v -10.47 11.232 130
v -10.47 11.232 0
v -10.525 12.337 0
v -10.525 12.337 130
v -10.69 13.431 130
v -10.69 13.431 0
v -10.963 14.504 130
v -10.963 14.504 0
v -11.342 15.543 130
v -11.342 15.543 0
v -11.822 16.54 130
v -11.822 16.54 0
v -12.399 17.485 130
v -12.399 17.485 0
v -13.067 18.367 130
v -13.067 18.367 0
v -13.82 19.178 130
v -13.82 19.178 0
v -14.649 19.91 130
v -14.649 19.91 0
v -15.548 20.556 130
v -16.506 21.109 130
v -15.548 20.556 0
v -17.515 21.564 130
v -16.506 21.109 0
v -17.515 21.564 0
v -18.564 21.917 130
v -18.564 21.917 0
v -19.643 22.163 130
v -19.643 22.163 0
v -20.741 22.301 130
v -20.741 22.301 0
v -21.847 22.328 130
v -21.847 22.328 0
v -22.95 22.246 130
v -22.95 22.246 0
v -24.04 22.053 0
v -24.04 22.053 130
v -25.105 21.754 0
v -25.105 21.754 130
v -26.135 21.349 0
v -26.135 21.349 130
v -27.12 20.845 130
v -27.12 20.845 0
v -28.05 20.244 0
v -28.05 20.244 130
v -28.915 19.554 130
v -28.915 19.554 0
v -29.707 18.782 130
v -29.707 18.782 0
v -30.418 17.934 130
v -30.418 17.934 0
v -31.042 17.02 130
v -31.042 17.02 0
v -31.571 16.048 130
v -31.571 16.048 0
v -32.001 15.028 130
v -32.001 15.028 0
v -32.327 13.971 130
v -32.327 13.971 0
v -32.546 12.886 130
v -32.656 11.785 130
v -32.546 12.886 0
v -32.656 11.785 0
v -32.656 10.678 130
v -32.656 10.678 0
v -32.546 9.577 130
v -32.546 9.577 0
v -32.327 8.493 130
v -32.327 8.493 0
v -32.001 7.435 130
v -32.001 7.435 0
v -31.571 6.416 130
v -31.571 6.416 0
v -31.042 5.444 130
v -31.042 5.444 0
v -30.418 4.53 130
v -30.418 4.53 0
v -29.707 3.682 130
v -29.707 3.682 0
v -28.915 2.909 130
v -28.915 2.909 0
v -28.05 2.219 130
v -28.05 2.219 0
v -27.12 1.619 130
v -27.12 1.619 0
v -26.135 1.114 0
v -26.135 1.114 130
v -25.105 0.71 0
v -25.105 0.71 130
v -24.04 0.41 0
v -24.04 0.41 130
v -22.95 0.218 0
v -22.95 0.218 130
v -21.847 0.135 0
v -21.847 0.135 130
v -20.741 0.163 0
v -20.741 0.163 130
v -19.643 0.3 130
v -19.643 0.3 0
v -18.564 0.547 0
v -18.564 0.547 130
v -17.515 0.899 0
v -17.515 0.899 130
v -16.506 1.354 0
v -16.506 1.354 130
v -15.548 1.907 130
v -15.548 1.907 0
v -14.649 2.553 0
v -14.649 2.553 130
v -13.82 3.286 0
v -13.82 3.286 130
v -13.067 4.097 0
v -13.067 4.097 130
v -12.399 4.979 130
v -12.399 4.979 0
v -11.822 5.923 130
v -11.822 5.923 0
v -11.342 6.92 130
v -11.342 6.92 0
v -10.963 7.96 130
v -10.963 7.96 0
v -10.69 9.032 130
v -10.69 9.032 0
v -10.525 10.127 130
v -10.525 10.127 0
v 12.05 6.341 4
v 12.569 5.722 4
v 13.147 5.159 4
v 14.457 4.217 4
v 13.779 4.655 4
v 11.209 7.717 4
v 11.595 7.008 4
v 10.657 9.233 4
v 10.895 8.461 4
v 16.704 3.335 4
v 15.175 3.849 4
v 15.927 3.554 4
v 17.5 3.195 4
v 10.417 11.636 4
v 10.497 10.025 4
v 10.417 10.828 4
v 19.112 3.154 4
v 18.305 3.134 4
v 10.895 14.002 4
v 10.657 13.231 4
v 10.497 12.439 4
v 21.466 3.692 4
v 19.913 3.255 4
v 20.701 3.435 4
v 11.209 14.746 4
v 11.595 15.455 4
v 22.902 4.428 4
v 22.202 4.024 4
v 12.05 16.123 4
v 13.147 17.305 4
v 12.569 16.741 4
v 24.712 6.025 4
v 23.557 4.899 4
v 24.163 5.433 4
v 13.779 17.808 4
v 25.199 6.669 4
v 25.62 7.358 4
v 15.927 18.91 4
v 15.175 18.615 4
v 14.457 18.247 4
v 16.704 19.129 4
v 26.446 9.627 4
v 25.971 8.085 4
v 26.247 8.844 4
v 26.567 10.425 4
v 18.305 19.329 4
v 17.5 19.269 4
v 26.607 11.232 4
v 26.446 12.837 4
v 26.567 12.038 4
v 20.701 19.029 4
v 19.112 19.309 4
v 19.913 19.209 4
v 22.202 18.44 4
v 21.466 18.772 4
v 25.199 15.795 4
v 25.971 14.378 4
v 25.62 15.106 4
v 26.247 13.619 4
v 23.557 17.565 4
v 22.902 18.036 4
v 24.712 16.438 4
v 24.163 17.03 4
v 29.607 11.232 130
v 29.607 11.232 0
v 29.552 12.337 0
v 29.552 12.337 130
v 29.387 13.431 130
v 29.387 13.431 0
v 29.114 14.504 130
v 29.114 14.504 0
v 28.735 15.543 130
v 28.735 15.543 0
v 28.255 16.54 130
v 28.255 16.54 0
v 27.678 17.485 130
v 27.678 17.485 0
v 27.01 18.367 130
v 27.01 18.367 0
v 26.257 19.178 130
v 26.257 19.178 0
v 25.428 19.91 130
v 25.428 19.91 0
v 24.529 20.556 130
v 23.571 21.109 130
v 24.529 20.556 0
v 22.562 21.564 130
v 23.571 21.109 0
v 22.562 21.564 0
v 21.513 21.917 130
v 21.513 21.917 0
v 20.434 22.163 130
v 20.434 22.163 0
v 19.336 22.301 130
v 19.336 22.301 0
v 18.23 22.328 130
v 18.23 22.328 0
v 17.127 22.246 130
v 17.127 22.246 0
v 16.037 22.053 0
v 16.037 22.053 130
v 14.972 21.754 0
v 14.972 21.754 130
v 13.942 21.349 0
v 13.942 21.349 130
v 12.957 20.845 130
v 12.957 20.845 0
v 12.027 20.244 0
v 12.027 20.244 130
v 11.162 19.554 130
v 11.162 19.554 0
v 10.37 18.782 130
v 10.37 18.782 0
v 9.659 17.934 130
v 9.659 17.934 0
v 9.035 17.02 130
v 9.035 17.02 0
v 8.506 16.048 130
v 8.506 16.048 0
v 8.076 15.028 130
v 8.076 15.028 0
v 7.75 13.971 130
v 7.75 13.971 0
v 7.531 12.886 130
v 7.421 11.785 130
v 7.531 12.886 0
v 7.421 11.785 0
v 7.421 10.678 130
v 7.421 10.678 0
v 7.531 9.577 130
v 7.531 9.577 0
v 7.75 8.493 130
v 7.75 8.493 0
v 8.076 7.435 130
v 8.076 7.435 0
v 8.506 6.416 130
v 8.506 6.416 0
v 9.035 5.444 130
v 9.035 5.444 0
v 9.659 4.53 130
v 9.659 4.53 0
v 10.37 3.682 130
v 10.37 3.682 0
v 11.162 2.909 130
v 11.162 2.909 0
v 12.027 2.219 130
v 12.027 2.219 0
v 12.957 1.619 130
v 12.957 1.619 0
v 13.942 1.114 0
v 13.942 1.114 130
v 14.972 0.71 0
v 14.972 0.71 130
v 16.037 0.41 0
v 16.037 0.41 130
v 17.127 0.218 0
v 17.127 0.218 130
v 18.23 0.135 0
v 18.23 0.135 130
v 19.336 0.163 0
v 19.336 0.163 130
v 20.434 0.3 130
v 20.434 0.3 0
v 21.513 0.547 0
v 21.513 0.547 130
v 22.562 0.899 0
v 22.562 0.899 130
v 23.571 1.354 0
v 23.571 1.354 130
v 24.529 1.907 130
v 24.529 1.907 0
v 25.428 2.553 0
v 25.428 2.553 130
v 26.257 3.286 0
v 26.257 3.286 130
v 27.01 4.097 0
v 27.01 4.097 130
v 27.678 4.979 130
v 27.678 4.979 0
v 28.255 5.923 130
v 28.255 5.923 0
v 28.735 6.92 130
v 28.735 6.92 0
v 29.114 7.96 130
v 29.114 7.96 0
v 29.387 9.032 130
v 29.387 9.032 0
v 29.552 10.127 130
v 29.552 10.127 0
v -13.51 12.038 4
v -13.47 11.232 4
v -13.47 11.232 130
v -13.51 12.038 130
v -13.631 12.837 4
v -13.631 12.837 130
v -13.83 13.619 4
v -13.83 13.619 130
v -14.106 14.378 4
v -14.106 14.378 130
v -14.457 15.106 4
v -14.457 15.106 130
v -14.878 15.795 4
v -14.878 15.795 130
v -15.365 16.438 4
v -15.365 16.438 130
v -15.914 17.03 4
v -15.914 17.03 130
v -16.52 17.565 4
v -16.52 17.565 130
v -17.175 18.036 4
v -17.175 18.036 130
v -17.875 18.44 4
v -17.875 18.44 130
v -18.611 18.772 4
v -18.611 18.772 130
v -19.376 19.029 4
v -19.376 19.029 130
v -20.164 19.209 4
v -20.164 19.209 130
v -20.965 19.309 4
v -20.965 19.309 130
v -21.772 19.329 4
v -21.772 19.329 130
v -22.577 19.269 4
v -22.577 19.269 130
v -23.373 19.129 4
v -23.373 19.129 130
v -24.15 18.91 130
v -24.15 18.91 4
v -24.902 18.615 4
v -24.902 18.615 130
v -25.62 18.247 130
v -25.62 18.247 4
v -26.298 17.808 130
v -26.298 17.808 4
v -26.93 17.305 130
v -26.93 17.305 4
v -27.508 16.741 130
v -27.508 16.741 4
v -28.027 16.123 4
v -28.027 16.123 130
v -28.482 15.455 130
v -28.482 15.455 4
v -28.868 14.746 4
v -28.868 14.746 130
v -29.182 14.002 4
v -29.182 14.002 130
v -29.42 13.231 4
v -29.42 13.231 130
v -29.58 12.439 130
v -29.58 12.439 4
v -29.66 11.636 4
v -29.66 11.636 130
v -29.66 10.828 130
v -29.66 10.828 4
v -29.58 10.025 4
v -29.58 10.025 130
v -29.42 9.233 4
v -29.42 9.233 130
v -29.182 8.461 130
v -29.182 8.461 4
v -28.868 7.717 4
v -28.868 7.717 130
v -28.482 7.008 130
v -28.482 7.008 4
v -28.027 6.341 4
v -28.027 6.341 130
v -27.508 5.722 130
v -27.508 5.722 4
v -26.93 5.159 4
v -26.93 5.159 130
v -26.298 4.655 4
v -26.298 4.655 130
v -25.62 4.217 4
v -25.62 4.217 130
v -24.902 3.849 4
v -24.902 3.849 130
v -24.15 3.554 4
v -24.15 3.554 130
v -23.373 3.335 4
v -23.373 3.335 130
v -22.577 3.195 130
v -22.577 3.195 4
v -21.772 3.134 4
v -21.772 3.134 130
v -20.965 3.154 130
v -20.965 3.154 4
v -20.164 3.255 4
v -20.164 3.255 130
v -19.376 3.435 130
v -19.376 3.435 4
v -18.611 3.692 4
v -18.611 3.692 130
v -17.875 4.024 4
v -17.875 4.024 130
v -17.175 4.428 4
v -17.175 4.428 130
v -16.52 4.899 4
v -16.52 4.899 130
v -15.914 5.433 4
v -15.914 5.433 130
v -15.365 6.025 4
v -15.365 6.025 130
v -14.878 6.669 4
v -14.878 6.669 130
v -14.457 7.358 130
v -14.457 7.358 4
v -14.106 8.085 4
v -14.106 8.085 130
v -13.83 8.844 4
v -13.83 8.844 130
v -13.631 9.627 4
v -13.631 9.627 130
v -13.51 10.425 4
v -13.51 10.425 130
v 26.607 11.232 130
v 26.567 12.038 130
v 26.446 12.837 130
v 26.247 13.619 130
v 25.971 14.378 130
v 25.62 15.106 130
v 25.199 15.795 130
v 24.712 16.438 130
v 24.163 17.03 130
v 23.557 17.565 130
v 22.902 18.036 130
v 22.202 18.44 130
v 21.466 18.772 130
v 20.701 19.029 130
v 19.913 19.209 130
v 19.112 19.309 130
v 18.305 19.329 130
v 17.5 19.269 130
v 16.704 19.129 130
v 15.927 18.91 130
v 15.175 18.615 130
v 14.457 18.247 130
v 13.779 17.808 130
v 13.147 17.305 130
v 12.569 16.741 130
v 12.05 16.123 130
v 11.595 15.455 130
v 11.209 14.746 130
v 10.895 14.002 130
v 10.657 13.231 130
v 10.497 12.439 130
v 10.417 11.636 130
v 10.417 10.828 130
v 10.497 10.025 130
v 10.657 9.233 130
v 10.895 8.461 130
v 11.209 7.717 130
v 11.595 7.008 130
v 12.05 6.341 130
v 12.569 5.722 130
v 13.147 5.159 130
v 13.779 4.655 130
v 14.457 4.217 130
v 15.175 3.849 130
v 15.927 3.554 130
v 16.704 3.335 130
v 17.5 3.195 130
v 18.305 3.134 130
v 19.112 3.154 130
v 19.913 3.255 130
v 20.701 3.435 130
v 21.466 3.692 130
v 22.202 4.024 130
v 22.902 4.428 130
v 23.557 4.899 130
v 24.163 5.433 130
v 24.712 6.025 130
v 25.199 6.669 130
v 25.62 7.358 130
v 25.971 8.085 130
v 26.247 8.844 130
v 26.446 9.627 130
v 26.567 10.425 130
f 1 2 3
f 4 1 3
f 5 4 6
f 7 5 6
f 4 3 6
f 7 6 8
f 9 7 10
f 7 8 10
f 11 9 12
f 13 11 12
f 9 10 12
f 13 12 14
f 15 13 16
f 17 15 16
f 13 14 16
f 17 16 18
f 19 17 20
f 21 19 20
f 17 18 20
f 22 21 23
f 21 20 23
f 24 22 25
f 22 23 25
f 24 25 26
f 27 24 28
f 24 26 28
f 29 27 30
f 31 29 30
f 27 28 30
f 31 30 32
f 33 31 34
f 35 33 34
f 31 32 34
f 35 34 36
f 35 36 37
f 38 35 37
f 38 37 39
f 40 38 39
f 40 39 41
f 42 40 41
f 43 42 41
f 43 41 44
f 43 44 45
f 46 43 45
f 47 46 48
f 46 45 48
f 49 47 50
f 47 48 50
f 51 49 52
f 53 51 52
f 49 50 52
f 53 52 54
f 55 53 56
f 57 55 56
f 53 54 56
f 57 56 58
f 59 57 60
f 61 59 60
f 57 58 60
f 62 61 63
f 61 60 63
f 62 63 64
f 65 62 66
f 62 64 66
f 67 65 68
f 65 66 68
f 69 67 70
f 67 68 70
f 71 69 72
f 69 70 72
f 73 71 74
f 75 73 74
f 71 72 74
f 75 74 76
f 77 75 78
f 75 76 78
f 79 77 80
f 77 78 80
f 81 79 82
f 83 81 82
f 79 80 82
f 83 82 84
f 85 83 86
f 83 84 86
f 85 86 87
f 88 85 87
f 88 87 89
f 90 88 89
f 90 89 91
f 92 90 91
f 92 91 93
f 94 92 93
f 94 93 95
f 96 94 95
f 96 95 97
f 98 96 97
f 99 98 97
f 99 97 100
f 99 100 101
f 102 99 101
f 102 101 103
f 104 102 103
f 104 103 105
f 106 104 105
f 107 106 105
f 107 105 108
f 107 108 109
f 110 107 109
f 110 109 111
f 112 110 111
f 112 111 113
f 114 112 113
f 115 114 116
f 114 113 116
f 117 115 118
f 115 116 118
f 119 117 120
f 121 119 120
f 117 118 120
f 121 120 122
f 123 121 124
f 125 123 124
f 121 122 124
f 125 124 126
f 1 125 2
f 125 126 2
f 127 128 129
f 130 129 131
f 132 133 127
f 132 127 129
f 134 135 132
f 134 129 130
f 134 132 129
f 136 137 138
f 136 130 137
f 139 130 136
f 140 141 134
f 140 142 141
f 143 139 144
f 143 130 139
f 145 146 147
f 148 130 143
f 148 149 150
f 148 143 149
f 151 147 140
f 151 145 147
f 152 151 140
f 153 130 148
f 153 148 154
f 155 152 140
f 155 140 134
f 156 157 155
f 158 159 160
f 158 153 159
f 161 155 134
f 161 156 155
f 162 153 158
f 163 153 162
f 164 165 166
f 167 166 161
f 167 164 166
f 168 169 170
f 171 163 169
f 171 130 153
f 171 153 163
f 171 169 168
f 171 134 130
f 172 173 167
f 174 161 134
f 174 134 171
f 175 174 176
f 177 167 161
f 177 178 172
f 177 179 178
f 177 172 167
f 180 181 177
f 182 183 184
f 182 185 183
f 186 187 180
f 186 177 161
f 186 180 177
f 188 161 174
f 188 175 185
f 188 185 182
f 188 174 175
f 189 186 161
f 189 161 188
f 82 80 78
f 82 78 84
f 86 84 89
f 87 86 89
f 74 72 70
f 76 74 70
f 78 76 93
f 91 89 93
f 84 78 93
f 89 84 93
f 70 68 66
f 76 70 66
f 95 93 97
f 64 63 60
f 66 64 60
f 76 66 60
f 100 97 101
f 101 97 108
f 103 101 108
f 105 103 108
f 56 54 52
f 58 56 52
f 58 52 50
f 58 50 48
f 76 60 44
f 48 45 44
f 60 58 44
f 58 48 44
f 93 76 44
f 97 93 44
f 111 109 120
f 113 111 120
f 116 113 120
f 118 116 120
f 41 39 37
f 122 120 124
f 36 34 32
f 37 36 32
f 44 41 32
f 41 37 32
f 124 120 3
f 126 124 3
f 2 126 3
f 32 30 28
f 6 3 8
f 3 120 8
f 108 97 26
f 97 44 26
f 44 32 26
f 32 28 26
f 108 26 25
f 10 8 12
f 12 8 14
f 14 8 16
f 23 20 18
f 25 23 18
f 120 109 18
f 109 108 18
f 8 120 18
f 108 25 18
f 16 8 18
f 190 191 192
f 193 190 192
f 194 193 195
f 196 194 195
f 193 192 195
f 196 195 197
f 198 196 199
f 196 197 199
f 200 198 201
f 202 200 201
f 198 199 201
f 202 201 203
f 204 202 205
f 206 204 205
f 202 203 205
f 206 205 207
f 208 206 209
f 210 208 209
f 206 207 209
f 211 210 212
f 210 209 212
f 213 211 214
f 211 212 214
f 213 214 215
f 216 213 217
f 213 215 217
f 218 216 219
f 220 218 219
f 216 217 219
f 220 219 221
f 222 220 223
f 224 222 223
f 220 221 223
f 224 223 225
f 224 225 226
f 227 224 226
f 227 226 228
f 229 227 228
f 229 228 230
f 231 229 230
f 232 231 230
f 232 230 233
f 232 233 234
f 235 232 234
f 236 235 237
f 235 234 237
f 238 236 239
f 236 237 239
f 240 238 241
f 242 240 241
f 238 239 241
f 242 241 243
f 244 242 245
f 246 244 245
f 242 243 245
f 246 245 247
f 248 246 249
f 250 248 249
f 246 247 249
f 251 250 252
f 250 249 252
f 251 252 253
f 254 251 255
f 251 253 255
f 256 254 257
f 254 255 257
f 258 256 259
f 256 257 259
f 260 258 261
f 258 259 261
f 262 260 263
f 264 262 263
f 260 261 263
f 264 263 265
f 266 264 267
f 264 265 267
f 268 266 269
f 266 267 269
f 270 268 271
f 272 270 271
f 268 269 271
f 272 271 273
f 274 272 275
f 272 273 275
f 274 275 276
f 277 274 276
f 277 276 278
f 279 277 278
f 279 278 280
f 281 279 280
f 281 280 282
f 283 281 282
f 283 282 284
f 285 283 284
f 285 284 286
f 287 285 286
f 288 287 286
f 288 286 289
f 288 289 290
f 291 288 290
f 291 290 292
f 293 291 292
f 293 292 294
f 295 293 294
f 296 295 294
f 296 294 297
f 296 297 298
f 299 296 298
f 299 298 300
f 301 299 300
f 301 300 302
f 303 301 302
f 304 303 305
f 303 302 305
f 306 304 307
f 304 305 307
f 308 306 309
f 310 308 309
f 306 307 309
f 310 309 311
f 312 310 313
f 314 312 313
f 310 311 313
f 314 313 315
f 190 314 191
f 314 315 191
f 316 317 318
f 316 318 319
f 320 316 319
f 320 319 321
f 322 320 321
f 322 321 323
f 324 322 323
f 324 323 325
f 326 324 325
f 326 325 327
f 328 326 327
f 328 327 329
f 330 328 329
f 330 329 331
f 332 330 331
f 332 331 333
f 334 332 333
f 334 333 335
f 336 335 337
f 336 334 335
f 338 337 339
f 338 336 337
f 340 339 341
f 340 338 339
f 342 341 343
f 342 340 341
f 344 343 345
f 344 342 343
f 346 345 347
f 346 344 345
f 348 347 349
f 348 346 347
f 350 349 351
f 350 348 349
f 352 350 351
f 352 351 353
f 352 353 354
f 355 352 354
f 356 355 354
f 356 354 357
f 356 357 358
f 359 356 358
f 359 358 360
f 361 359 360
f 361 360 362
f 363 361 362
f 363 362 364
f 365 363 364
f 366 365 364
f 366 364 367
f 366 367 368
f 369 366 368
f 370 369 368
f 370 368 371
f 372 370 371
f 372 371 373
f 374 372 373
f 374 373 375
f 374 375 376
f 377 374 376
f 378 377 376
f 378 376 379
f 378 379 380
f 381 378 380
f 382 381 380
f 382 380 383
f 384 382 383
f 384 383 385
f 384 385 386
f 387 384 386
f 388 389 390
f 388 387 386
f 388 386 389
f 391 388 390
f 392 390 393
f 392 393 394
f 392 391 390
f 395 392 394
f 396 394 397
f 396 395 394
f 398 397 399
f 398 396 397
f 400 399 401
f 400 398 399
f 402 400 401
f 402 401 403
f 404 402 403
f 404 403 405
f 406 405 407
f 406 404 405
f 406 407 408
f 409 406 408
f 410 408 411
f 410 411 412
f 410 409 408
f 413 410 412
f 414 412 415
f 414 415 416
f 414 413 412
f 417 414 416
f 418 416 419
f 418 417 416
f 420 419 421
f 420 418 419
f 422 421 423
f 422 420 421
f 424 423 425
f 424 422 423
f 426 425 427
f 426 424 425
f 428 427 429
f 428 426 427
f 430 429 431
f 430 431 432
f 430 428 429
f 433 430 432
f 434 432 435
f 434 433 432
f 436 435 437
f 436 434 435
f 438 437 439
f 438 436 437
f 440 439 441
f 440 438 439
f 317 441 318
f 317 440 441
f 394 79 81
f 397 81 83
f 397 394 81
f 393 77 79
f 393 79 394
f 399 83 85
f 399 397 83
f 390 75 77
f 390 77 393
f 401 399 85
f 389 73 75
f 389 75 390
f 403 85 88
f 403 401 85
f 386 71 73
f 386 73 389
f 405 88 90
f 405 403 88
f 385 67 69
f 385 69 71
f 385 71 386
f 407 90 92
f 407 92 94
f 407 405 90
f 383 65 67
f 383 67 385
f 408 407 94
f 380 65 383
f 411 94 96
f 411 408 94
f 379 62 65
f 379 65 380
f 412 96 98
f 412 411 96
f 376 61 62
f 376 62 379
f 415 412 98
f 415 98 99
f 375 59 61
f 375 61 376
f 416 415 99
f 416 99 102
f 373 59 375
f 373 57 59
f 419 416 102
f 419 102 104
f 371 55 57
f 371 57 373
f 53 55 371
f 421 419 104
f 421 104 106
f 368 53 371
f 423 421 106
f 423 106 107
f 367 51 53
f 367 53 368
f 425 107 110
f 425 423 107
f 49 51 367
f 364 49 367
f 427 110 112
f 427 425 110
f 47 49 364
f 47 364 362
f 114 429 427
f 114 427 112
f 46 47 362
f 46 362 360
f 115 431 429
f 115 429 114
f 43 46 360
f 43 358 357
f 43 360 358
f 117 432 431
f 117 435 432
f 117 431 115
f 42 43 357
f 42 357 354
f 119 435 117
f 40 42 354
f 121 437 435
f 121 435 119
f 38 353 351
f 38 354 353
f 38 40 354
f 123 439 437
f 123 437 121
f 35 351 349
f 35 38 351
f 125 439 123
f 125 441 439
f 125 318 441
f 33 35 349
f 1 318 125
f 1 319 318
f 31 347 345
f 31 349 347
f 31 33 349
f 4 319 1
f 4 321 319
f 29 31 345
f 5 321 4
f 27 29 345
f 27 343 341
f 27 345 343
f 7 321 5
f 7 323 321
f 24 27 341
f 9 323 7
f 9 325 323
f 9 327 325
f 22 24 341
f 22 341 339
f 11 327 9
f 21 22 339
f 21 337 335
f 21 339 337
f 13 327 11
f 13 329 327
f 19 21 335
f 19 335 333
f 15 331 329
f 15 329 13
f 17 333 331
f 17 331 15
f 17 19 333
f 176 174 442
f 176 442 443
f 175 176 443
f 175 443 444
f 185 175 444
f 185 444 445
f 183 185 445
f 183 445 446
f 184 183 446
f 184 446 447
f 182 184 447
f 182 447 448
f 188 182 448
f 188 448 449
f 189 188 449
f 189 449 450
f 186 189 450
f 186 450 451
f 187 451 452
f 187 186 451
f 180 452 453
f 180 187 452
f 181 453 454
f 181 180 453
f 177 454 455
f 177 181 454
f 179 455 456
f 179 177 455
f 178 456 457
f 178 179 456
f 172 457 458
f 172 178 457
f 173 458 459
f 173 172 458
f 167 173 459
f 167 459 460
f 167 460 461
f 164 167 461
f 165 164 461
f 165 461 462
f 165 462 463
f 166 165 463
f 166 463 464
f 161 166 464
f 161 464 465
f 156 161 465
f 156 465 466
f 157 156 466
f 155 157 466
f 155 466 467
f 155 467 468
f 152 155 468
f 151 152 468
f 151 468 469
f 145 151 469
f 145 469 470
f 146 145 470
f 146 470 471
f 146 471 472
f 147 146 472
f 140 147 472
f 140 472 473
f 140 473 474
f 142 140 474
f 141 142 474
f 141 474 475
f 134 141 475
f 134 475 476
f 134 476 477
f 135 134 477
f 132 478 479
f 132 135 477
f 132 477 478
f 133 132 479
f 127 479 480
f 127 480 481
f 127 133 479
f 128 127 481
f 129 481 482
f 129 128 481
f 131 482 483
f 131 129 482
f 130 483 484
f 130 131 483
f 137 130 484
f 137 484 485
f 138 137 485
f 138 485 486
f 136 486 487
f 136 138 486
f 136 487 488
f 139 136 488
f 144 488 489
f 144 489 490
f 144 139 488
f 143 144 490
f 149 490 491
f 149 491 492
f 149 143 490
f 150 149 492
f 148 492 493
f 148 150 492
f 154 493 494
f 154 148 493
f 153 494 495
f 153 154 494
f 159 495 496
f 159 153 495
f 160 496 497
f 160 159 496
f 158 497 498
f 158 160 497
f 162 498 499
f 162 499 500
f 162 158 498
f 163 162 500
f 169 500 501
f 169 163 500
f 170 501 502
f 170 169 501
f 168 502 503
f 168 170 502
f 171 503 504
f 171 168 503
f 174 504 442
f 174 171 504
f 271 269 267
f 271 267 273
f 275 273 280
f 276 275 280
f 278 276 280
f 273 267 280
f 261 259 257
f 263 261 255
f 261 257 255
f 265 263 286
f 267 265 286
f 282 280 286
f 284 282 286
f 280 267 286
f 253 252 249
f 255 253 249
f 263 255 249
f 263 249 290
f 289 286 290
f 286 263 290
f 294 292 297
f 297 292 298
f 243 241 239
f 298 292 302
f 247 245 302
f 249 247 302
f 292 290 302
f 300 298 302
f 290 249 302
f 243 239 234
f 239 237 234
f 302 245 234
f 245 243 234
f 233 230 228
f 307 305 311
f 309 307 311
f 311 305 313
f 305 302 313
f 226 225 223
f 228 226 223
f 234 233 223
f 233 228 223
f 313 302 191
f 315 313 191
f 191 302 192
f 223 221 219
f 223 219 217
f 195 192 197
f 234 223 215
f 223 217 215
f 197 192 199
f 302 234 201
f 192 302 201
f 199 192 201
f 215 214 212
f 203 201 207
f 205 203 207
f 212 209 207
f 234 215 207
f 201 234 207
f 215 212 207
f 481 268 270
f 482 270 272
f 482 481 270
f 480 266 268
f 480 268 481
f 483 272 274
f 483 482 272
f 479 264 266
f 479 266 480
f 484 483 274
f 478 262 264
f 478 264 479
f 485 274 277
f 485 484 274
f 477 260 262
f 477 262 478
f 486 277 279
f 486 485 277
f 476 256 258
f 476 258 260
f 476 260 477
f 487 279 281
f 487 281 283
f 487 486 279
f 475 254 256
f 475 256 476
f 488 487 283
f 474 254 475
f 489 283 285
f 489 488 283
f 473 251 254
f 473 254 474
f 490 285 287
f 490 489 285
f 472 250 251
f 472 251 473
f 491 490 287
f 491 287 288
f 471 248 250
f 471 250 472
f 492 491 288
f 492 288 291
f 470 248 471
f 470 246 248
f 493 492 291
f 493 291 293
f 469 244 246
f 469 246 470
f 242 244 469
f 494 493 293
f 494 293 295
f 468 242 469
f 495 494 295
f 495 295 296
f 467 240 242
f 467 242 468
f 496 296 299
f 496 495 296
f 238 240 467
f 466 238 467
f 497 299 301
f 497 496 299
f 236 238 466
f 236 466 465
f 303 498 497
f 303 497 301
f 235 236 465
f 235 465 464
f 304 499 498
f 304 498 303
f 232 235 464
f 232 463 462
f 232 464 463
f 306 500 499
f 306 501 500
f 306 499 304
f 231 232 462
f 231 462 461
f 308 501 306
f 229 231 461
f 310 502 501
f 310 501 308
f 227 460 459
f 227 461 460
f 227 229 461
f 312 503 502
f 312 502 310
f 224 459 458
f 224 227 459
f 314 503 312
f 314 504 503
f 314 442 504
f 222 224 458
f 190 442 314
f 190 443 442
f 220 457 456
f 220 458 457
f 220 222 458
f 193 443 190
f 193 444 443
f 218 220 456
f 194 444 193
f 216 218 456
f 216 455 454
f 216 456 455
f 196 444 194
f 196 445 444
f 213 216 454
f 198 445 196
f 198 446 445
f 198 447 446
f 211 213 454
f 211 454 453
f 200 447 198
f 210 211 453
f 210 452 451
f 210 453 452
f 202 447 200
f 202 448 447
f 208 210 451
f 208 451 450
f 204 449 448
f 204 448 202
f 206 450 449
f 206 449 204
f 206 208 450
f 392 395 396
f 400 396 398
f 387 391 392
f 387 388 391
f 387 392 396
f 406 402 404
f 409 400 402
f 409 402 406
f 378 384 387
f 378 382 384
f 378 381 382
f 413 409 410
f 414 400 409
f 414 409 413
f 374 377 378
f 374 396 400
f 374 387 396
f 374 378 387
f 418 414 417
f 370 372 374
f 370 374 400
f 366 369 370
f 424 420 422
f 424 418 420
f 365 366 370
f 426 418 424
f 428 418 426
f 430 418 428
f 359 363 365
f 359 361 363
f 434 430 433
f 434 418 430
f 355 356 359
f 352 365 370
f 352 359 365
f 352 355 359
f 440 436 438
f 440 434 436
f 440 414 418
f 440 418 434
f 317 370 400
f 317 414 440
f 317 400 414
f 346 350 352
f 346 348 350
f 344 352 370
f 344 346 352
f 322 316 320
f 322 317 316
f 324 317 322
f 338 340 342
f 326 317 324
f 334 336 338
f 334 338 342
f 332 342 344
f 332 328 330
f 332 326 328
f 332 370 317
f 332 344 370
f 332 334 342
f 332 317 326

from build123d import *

# Parameters (mm, degrees)
F0_R     = 11.1
F0_R_2   = 8.1
F1_DEPTH = 130
F2_DEPTH = 130
F3_R     = 9.39300938
F4_DEPTH = 4


with BuildPart() as f1:
    # F0 (on Top) → F1 (new body)
    with BuildSketch(Plane.XY):
        with Locations((-21.5700976551, 11.2317660823)):
            Circle(F0_R)
        with Locations((-21.5700976551, 11.2317660823)):
            Circle(F0_R_2, mode=Mode.SUBTRACT)
    extrude(amount=F1_DEPTH)

    # F0 (on Top) → F2 (join)
    with BuildSketch(Plane.XY):
        with Locations((-21.5700976551, 11.2317660823)):
            Circle(F0_R)
        with Locations((-21.5700976551, 11.2317660823)):
            Circle(F0_R_2, mode=Mode.SUBTRACT)
    extrude(amount=F2_DEPTH)

    # F3 (on Top) → F4, piece 2 (join)
    with BuildSketch(Plane.XY):
        with Locations((-21.5700976551, 11.231767945)):
            Circle(F3_R)
    extrude(amount=F4_DEPTH)


with BuildPart() as f2:
    # F0 (on Top) → F2, piece 2 (new body)
    with BuildSketch(Plane.XY):
        with Locations((18.5068864375, 11.231767945)):
            Circle(F0_R)
        with Locations((18.5068864375, 11.231767945)):
            Circle(F0_R_2, mode=Mode.SUBTRACT)
    extrude(amount=F2_DEPTH)

    # F3 (on Top) → F4 (join)
    with BuildSketch(Plane.XY):
        with Locations((18.5068864375, 10.9764998779)):
            Circle(F3_R)
    extrude(amount=F4_DEPTH)


solid = Compound([f1.part, f2.part])
